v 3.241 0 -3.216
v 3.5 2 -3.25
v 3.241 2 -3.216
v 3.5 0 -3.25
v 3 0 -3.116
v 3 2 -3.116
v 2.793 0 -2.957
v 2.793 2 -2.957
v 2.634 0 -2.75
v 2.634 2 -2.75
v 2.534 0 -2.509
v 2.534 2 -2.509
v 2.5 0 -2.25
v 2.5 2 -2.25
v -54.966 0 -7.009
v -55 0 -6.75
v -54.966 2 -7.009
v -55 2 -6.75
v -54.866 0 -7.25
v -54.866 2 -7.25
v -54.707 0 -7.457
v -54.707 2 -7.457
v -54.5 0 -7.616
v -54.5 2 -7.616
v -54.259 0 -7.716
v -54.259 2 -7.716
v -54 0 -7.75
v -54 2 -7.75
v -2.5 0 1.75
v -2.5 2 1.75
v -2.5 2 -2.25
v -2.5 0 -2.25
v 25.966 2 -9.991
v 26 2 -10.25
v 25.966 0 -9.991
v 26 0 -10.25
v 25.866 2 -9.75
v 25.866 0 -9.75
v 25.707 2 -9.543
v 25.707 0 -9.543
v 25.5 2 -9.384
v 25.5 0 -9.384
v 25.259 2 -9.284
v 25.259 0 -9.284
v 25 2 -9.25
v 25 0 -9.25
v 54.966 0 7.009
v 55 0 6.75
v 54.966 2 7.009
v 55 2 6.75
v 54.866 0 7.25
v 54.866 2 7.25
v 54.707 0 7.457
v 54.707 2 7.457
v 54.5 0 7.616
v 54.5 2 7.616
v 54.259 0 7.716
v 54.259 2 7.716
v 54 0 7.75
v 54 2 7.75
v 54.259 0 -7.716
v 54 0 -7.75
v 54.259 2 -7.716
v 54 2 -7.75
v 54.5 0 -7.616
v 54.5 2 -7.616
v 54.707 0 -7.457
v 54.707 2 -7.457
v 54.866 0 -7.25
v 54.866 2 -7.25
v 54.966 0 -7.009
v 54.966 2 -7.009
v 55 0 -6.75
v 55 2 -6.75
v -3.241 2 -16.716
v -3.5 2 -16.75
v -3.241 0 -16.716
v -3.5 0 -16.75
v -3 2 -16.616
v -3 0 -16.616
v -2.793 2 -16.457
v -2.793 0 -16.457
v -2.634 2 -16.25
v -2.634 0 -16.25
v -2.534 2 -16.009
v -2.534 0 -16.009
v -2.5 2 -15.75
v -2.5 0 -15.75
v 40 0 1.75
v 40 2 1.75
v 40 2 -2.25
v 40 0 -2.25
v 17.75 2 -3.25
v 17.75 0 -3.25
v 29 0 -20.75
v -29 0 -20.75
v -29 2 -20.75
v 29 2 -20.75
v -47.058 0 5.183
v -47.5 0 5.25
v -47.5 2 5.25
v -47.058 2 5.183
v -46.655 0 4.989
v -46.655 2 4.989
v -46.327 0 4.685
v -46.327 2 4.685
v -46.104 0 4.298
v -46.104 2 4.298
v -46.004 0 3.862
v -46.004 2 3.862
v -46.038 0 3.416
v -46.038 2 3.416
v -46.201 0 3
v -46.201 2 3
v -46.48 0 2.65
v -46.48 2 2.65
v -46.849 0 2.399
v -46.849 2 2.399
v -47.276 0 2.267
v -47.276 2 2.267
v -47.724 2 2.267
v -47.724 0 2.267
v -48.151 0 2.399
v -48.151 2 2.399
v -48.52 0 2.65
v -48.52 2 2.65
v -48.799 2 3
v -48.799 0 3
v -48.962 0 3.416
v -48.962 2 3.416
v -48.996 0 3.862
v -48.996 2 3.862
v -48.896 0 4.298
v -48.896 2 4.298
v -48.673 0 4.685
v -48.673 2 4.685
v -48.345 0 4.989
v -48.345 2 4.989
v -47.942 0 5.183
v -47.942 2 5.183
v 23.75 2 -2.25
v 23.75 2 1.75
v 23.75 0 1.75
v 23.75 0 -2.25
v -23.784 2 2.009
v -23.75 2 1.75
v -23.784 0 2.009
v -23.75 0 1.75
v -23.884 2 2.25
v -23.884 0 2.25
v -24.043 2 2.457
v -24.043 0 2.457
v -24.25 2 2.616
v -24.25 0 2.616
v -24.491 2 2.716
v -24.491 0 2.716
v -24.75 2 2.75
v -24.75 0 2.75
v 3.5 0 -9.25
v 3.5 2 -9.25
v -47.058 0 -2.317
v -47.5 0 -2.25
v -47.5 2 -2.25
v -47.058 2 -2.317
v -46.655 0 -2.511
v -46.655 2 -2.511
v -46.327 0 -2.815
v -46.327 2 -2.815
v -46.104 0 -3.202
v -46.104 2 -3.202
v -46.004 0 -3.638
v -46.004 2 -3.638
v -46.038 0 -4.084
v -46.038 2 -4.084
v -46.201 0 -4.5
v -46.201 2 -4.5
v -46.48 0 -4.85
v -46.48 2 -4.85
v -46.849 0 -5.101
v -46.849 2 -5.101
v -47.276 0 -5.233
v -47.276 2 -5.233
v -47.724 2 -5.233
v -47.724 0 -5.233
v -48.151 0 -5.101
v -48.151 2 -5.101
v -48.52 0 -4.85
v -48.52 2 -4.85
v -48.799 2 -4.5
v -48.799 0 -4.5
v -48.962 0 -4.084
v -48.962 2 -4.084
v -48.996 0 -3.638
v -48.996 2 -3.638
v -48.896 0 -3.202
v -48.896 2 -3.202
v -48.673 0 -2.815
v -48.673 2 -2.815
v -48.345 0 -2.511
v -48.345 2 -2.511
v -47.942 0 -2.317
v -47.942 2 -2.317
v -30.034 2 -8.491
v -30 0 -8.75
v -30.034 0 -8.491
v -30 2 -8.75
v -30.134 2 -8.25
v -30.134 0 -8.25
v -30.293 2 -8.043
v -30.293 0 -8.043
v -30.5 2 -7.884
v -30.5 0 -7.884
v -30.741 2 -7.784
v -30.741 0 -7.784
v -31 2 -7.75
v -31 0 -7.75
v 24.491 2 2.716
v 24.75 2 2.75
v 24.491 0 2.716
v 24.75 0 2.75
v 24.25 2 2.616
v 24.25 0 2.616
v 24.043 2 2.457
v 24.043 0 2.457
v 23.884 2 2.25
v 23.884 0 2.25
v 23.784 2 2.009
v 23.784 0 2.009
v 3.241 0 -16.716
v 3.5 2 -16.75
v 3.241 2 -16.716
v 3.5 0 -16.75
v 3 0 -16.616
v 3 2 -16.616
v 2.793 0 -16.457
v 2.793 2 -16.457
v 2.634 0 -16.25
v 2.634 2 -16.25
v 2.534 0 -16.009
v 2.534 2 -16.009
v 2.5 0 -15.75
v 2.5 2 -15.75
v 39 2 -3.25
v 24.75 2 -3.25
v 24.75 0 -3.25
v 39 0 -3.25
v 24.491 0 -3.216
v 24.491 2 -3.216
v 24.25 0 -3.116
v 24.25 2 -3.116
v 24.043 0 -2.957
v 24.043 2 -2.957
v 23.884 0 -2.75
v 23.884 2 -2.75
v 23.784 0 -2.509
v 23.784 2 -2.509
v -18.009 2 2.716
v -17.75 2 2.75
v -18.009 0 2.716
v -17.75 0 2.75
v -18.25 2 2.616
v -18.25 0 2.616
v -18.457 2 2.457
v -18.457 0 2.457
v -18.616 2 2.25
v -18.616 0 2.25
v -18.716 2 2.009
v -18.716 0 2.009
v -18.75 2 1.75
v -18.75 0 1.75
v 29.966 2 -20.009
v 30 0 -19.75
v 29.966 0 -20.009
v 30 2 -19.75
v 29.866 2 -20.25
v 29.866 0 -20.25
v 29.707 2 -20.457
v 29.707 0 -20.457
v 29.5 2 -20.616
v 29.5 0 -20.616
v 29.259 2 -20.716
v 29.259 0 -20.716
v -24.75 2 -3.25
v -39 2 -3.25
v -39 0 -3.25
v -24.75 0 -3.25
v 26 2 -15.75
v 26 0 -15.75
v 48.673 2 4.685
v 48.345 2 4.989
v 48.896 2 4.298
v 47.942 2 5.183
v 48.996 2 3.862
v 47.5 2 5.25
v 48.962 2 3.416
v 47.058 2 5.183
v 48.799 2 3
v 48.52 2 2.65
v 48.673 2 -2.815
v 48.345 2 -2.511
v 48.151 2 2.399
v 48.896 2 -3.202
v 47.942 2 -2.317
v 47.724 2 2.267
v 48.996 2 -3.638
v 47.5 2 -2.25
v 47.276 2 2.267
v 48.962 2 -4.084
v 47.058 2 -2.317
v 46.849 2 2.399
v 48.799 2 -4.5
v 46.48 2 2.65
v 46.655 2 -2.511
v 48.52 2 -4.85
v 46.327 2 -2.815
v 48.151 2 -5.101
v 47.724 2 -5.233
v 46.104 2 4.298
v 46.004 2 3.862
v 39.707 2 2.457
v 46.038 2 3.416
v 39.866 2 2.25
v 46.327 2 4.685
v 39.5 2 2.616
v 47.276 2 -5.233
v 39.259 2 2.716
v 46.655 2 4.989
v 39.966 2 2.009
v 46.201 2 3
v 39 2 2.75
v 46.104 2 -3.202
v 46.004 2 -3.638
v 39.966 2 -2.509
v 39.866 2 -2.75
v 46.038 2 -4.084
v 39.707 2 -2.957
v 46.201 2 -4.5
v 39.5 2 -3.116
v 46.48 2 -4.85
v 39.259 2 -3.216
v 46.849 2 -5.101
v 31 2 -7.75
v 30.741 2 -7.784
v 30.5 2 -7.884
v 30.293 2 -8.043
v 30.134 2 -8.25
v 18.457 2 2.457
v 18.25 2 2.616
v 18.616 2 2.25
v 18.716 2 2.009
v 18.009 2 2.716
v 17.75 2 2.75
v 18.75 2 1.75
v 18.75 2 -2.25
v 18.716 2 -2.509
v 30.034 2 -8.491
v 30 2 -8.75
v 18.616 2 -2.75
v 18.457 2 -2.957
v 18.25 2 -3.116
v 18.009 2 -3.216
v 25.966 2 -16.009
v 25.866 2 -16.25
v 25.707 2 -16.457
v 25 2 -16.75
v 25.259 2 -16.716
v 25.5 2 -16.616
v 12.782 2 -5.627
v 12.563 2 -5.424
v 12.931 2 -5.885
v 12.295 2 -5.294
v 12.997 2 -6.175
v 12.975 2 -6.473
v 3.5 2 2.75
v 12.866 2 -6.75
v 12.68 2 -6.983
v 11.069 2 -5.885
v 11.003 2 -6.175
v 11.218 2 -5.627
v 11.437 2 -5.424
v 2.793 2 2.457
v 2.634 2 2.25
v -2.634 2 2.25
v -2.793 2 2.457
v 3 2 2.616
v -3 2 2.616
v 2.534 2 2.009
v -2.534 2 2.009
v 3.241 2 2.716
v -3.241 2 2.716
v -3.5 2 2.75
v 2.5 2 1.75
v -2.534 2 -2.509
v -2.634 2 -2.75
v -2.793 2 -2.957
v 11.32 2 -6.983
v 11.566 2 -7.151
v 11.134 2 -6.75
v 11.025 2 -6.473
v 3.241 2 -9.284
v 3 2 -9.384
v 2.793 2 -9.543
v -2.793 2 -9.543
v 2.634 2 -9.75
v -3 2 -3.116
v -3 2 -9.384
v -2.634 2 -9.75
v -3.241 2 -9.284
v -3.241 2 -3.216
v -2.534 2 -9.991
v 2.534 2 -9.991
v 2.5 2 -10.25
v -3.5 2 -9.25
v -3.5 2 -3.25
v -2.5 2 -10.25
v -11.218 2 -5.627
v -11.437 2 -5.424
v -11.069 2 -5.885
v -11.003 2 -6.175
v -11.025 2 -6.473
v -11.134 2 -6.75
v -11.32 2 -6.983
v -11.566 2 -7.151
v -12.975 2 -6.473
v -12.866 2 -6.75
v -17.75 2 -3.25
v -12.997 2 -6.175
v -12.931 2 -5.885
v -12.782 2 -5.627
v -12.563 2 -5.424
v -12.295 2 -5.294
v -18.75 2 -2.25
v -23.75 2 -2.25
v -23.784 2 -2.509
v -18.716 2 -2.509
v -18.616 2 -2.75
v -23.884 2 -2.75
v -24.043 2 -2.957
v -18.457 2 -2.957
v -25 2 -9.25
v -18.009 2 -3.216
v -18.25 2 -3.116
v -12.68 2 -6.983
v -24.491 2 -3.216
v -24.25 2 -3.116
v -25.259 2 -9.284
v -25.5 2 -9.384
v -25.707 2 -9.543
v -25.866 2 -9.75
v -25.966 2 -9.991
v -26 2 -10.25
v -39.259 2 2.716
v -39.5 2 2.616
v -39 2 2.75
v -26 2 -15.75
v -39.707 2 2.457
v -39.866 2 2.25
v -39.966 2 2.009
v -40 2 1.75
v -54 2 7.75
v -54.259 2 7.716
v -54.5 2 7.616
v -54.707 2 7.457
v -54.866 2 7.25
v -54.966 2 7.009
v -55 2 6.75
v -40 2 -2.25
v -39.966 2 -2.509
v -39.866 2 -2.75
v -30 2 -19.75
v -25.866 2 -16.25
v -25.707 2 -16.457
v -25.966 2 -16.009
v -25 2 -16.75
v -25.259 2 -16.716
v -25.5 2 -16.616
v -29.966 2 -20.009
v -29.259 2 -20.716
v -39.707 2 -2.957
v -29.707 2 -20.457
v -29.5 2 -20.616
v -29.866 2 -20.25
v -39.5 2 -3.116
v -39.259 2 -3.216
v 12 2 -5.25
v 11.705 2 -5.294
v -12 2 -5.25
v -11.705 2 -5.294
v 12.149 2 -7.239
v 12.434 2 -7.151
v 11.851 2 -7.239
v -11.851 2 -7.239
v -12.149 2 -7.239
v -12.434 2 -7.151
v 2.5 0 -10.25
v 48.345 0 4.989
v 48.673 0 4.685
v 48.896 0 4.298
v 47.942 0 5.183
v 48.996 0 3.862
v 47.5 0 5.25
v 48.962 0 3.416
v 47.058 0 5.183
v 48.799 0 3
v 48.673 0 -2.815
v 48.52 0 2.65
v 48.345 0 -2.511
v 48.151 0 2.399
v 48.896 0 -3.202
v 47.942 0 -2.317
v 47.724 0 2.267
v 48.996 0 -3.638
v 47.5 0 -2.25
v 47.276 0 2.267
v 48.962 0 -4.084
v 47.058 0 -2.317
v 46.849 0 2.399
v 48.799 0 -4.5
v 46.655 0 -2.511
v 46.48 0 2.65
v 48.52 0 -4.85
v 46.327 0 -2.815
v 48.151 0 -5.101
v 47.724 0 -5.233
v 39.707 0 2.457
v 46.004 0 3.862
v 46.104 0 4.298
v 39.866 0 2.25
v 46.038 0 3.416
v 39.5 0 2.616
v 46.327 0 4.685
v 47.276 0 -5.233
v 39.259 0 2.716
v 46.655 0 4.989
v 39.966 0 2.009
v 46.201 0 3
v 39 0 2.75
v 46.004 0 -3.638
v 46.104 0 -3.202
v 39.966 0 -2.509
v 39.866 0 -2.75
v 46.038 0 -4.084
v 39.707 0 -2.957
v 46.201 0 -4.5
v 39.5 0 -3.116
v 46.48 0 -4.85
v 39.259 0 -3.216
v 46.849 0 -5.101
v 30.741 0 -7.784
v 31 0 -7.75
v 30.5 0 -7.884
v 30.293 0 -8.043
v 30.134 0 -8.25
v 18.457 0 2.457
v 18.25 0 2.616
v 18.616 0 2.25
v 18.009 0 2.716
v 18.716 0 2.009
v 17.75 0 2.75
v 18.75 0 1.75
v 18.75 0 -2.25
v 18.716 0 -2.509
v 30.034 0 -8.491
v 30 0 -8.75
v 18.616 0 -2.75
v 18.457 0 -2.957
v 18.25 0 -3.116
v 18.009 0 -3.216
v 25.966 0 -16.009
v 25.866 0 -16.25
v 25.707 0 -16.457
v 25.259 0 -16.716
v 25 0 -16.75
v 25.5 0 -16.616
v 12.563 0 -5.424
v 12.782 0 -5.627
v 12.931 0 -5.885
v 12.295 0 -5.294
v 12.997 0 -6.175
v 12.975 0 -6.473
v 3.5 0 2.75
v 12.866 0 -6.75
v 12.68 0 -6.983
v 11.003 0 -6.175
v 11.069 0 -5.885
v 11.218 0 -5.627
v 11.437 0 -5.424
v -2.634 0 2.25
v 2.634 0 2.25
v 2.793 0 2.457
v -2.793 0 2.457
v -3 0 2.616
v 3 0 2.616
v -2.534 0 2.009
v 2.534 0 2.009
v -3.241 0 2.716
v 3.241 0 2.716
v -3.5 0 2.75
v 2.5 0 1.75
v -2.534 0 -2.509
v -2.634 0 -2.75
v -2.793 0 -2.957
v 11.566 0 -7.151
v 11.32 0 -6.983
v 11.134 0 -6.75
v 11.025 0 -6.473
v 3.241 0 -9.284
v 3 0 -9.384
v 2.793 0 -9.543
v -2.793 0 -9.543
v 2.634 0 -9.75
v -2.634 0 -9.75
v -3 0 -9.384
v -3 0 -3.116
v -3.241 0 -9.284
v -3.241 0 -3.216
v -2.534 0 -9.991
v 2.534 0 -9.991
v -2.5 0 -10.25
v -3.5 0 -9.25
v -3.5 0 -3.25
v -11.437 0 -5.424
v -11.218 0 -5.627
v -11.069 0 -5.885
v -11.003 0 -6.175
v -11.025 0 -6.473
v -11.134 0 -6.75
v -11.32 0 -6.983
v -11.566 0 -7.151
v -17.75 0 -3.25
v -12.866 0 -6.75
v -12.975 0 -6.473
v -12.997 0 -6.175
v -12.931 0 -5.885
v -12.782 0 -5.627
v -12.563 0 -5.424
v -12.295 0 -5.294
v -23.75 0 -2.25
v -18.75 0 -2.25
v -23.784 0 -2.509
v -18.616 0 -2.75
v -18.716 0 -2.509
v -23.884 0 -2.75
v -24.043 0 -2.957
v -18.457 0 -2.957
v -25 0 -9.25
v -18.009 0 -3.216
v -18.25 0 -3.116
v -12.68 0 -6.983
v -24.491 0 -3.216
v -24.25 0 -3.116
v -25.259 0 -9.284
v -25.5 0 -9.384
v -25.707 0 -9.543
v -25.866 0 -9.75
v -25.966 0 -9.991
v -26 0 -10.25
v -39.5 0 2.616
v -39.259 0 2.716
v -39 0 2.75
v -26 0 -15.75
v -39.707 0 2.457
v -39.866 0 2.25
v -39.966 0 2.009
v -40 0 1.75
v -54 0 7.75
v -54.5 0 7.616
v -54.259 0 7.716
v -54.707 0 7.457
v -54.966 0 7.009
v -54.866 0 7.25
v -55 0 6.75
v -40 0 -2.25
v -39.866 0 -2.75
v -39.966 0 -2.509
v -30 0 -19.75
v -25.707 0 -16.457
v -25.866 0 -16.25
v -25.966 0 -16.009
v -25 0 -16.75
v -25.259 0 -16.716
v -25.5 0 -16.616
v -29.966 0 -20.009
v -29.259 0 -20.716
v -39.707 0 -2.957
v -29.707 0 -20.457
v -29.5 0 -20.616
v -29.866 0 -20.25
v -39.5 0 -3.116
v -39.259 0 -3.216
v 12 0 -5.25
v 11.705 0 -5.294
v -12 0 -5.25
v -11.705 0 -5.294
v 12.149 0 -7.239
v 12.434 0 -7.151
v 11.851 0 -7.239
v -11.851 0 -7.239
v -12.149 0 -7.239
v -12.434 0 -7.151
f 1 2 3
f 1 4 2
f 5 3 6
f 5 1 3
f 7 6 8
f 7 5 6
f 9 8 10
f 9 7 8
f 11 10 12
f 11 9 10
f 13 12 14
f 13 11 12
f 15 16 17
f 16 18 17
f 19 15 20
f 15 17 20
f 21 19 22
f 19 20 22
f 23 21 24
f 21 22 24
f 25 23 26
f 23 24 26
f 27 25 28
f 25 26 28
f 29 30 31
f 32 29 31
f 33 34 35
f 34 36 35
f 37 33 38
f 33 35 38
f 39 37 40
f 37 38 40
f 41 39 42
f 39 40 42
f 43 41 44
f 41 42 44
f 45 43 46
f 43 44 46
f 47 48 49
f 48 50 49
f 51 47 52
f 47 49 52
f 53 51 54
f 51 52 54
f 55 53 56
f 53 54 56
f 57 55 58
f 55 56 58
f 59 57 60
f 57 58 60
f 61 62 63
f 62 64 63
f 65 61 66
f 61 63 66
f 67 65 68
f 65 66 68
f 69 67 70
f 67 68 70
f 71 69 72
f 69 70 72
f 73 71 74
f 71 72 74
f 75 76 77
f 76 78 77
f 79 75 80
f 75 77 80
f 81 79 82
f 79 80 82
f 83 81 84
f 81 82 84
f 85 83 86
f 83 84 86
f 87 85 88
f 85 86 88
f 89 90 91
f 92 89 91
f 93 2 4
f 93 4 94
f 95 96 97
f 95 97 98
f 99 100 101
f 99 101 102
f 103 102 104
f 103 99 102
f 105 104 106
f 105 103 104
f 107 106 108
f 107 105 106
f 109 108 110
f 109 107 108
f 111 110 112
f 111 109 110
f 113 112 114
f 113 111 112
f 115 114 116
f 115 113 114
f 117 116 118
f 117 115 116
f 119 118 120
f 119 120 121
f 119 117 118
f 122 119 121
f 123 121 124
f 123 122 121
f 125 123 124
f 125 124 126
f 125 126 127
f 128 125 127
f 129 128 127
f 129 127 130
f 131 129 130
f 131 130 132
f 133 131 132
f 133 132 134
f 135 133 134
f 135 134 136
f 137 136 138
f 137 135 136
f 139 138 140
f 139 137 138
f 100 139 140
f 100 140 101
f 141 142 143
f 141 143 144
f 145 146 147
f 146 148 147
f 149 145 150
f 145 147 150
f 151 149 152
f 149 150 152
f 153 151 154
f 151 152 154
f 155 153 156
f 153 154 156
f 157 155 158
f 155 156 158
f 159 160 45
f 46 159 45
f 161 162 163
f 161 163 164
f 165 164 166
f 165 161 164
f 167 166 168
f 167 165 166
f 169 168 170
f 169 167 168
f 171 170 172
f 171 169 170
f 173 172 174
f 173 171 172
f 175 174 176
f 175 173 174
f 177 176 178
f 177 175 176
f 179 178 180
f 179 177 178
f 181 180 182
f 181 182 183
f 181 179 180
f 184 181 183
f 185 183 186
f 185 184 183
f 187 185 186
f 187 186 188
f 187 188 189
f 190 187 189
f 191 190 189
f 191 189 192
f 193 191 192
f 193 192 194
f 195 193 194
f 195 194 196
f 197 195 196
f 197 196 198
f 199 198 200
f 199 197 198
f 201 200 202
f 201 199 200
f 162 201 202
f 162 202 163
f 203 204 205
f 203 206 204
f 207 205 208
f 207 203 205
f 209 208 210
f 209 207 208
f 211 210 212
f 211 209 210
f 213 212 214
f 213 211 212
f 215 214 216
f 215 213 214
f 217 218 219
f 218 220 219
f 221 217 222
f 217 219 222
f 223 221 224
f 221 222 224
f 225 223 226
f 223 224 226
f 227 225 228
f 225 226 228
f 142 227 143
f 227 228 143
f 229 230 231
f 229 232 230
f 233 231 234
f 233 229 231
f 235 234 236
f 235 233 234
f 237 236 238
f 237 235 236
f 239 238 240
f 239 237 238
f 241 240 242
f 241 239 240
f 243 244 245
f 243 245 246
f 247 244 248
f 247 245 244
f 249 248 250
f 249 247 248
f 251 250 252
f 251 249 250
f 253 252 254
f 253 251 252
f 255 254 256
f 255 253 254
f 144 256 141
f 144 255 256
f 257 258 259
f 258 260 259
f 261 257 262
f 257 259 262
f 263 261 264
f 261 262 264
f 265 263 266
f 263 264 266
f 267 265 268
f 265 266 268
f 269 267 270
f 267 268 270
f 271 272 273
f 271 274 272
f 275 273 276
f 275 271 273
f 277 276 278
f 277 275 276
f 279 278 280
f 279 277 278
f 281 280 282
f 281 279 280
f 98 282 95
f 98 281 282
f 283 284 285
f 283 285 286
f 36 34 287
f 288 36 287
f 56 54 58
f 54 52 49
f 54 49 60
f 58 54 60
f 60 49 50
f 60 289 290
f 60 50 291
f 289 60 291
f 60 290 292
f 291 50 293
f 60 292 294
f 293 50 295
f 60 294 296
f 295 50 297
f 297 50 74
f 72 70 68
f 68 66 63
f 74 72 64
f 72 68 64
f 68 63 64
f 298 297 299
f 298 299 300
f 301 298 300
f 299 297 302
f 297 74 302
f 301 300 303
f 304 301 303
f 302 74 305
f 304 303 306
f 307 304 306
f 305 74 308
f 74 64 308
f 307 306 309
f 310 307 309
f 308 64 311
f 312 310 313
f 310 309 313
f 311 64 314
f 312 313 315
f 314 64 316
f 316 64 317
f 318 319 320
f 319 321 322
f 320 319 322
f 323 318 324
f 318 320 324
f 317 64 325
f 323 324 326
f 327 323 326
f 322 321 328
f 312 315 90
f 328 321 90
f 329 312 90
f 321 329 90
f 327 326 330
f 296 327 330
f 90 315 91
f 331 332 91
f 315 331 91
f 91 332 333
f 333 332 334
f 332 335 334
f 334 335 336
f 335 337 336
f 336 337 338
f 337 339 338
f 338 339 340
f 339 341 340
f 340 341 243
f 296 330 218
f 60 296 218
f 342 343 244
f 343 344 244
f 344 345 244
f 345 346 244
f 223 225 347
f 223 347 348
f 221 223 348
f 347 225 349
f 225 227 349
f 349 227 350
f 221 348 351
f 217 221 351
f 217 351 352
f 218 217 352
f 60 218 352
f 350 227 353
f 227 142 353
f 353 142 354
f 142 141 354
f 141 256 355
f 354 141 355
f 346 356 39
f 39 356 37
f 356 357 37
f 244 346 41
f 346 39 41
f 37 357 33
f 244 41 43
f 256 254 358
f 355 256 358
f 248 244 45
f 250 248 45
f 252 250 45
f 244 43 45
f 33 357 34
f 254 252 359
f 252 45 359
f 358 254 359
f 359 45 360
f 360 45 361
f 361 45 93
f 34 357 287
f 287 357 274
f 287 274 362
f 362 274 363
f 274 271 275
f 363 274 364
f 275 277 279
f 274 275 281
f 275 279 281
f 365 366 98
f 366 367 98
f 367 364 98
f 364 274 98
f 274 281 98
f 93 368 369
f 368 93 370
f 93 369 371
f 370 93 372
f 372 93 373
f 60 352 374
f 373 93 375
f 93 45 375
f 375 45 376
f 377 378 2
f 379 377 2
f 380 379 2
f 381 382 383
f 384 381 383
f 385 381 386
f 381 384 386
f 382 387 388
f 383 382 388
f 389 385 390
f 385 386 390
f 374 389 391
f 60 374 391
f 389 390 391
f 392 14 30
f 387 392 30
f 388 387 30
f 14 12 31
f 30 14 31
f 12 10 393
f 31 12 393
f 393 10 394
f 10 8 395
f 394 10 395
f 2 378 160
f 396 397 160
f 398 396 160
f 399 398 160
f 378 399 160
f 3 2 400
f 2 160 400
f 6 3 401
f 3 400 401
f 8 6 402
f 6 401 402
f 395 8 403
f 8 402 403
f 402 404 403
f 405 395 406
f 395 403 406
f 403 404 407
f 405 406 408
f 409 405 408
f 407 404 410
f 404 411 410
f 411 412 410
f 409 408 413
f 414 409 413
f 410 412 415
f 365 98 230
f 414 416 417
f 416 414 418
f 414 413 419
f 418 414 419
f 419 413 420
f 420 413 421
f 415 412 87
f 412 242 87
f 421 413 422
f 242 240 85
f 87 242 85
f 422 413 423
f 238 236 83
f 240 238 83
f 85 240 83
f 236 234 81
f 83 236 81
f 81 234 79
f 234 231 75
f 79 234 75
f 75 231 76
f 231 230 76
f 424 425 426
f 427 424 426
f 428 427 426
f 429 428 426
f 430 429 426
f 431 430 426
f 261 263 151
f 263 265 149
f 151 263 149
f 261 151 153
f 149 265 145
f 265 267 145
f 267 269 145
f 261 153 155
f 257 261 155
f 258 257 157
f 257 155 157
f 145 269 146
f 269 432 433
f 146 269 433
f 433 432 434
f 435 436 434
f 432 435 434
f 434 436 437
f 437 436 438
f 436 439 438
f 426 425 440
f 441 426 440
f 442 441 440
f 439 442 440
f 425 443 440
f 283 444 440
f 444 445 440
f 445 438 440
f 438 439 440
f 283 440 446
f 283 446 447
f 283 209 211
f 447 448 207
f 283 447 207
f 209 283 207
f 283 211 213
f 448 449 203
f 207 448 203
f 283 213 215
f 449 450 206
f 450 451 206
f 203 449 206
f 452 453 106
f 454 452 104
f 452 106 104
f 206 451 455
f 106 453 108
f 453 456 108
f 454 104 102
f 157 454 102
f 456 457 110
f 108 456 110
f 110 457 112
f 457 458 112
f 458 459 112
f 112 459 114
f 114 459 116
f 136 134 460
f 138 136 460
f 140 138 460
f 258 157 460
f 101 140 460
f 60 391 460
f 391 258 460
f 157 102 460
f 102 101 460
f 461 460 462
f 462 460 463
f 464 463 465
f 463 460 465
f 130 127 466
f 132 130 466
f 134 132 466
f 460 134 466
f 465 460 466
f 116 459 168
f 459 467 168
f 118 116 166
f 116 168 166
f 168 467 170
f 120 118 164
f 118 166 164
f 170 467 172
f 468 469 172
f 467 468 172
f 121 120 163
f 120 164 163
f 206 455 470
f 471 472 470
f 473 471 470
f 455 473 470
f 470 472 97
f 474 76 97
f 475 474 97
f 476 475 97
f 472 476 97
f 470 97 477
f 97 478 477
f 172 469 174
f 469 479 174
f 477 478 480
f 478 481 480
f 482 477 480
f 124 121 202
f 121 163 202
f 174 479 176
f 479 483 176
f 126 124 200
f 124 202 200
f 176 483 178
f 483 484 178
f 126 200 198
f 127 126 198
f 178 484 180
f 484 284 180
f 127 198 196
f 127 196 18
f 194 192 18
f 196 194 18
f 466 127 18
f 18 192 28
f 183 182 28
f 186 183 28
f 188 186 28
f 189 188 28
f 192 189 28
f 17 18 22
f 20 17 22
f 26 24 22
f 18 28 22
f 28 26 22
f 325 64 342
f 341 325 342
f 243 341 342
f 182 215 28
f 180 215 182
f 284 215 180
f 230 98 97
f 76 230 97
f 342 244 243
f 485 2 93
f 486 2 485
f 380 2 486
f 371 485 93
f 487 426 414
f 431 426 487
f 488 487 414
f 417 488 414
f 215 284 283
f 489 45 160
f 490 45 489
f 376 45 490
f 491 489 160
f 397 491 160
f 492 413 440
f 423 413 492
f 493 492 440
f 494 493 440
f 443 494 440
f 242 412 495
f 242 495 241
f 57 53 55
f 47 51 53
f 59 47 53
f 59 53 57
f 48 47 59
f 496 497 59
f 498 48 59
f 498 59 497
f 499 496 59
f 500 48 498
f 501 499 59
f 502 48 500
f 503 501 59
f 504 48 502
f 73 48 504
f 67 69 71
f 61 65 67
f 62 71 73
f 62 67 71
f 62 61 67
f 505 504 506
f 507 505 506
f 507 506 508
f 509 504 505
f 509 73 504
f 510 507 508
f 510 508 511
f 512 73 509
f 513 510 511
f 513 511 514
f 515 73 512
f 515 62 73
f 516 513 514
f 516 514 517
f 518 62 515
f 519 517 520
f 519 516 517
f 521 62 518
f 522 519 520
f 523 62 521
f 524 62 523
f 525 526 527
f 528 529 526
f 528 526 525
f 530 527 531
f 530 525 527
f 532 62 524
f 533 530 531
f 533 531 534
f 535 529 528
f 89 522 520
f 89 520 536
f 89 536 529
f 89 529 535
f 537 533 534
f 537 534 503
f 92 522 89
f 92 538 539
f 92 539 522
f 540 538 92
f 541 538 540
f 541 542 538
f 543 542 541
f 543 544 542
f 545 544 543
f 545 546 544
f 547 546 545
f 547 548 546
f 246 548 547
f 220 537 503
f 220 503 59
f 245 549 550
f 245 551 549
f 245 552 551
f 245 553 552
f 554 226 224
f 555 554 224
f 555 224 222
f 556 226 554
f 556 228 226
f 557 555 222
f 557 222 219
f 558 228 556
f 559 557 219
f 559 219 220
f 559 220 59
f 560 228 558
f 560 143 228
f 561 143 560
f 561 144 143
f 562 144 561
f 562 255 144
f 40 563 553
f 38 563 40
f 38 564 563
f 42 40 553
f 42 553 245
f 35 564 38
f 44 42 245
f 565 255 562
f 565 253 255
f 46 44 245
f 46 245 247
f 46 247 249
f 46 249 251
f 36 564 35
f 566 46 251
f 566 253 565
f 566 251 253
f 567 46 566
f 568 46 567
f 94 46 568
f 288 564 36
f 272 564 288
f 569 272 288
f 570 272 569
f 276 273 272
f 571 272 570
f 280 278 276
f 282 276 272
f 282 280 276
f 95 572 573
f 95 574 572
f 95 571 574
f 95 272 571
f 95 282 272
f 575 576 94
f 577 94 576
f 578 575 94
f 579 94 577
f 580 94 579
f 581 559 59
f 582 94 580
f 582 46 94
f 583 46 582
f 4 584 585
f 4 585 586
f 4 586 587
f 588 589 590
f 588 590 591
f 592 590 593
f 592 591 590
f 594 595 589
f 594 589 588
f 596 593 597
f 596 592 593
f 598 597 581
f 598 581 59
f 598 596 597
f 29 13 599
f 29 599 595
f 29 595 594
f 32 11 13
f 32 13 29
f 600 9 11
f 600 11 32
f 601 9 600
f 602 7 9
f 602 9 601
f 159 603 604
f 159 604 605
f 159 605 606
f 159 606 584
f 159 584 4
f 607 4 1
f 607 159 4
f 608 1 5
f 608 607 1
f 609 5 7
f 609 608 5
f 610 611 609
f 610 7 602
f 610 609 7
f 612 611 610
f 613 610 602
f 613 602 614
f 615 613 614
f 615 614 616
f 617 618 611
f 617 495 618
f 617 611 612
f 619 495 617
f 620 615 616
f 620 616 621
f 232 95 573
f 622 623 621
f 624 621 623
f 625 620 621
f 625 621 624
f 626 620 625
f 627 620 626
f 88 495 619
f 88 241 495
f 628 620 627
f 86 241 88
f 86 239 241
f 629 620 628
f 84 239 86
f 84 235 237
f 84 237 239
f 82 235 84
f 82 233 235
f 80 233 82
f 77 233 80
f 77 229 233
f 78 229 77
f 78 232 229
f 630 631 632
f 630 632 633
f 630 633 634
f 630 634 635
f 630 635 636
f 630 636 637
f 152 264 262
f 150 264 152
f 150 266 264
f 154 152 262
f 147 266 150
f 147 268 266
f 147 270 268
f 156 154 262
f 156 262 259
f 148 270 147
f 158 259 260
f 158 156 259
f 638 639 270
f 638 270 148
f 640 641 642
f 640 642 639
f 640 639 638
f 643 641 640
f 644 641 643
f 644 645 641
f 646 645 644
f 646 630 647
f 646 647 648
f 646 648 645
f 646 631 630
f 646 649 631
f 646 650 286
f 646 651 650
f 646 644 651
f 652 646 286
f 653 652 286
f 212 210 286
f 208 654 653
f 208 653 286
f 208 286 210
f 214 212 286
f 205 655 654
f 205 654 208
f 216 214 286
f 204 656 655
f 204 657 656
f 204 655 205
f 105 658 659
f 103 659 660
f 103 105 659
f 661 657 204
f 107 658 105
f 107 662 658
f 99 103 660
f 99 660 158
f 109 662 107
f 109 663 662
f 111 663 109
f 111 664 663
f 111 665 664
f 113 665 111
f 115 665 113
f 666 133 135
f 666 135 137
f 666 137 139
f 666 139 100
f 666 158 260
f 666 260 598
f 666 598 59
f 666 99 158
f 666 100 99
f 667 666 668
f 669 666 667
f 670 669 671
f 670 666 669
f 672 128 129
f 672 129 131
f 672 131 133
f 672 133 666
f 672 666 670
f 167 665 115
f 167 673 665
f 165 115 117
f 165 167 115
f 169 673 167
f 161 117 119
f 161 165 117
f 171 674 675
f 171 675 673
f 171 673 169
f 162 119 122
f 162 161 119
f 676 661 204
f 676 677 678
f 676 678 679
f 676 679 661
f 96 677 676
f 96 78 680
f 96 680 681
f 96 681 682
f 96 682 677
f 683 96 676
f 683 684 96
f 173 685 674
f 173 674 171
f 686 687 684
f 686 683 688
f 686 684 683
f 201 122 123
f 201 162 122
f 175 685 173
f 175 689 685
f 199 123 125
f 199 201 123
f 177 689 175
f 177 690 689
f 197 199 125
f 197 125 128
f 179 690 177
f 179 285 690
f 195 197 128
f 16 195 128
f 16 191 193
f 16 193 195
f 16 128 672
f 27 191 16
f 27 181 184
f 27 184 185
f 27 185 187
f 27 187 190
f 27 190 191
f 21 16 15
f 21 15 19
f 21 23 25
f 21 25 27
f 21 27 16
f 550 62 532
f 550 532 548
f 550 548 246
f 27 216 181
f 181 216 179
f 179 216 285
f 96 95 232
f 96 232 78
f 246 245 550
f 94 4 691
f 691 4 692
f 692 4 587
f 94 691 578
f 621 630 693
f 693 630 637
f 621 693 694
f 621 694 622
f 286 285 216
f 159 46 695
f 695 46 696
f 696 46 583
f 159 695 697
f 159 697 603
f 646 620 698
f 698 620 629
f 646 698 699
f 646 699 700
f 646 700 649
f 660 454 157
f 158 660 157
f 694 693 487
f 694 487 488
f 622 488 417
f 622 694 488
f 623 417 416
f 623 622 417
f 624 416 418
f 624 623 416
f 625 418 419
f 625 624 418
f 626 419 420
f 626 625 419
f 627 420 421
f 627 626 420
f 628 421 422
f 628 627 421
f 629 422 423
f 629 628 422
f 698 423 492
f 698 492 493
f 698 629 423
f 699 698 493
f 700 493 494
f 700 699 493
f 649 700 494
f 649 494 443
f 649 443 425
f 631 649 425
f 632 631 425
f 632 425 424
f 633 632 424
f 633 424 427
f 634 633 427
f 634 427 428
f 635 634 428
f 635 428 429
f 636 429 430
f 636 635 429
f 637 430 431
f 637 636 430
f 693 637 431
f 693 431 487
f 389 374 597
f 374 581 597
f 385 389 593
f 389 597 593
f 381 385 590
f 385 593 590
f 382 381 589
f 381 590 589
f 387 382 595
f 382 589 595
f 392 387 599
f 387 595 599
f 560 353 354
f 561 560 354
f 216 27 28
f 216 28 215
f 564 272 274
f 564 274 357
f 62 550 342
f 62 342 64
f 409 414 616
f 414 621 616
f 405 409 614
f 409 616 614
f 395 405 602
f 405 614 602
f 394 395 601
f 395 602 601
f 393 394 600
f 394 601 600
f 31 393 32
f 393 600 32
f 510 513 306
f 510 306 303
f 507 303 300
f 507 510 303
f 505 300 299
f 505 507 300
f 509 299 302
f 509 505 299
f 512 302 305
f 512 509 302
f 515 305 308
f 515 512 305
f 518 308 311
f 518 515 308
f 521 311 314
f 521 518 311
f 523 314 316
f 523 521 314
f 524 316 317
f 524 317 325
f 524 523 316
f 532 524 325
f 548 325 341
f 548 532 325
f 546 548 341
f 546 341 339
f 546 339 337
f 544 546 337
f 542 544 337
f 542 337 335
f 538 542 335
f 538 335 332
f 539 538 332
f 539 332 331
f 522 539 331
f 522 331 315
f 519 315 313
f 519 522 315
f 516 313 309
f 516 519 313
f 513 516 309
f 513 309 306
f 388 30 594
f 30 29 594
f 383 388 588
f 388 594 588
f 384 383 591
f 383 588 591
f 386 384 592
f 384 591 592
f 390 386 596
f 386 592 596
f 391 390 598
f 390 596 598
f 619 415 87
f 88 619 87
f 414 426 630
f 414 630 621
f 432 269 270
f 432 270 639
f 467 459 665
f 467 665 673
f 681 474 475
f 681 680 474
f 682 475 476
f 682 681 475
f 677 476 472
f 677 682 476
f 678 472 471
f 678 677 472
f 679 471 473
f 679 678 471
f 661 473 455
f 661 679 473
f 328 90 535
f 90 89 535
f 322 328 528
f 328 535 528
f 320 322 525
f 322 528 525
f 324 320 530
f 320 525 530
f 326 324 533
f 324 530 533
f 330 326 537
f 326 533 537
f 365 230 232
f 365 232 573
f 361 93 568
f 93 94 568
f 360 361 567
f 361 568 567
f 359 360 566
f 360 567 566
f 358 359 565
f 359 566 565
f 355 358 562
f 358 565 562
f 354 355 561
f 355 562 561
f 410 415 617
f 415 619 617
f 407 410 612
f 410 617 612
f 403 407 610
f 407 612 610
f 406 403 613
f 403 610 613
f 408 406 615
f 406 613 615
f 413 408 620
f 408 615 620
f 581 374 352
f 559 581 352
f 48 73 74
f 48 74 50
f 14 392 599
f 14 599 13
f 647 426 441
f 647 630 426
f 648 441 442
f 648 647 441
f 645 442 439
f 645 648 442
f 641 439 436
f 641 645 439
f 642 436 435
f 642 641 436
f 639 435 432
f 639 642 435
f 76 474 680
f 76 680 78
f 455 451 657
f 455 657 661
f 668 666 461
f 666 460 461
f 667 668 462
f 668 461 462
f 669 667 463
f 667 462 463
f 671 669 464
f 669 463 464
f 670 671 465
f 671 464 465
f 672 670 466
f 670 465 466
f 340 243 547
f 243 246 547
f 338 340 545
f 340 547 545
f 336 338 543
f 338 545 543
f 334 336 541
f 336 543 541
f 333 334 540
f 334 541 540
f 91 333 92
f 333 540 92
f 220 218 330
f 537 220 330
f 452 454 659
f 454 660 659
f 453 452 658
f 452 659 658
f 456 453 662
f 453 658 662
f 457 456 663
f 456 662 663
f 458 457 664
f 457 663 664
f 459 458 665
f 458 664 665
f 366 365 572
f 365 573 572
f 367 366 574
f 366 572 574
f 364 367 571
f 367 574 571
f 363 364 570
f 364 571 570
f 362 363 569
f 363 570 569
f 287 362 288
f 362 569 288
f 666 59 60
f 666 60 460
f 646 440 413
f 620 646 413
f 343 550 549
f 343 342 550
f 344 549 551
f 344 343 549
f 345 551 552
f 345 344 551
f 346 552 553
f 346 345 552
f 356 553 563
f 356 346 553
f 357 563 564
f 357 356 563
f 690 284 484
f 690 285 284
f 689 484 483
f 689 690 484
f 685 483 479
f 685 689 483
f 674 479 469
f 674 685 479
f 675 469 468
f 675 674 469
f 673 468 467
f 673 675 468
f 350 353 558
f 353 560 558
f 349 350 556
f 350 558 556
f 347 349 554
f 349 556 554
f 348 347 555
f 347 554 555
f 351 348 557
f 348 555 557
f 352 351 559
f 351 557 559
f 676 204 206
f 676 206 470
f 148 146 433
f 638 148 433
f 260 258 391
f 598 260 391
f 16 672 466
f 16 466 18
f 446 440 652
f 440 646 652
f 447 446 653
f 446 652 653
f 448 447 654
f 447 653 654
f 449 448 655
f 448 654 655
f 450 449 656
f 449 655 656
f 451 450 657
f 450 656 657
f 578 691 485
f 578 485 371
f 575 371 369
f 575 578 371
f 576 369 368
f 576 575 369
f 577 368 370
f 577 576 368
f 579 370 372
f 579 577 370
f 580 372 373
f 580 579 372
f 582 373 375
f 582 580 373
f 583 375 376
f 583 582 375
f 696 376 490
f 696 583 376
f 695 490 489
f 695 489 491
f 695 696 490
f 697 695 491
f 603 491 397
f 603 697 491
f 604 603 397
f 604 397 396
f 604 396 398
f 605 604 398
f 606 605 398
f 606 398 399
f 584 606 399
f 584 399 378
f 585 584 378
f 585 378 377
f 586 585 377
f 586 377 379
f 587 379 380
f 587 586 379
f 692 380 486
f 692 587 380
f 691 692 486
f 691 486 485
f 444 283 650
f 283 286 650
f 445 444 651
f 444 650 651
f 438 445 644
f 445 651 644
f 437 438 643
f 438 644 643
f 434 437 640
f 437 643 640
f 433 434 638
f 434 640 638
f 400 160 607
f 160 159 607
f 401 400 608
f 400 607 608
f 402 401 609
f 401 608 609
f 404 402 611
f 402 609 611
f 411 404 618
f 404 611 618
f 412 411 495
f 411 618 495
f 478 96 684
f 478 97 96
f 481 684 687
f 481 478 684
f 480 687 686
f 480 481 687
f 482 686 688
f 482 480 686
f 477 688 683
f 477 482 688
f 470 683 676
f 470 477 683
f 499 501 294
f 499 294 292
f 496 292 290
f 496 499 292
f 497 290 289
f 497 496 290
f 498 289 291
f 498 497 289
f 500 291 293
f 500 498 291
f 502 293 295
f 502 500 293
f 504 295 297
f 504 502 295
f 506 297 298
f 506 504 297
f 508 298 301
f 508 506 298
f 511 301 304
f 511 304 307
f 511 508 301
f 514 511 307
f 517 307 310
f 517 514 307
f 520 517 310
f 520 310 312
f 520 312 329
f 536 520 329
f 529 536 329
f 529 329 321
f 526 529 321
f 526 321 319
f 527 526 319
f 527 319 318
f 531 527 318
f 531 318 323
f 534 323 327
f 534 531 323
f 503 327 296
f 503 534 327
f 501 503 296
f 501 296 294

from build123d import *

# Parameters (mm, degrees)
SKETCH_1_R          = 1.5
SKETCH_1_R_2        = 1
EXTRUDE_1_DEPTH     = 2
SKETCH_2_W          = 16.25
SKETCH_2_H          = 6
SKETCH_2_W_2        = 23.5
SKETCH_2_H_2        = 7.5
CUT_EXTRUDE_1_DEPTH = 59.8180457
FILLET_1_R          = 1


with BuildPart() as part:
    # 草图1 → 凸台-拉伸1 (new body)
    with BuildSketch(Plane(origin=(0, 0, 0), x_dir=(1, 0, 0), z_dir=(0, 1, 0))):
        Polygon((30, 7.75), (55, 7.75), (55, -7.75), (-55, -7.75), (-55, 7.75), (-30, 7.75), (-30, 20.75), (30, 20.75), align=None)
        with Locations(Location((-47.5, 3.75, 0), (0, 0, 270))):
            Circle(SKETCH_1_R, mode=Mode.SUBTRACT)
        with Locations(Location((-47.5, -3.75, 0), (0, 0, 270))):
            Circle(SKETCH_1_R, mode=Mode.SUBTRACT)
        with Locations(Location((47.5, 3.75, 0), (0, 0, 270))):
            Circle(SKETCH_1_R, mode=Mode.SUBTRACT)
        with Locations(Location((47.5, -3.75, 0), (0, 0, 270))):
            Circle(SKETCH_1_R, mode=Mode.SUBTRACT)
        with Locations(Location((-12, 6.25, 0), (0, 0, 270))):
            Circle(SKETCH_1_R_2, mode=Mode.SUBTRACT)
        with Locations(Location((12, 6.25, 0), (0, 0, 270))):
            Circle(SKETCH_1_R_2, mode=Mode.SUBTRACT)
    extrude(amount=EXTRUDE_1_DEPTH)

    # 草图2 → 切除-拉伸1 (cut, through all)
    with BuildSketch(Plane(origin=(0, 2, 0), x_dir=(1, 0, 0), z_dir=(0, 1, 0))):
        with Locations((-31.875, 0.25)):
            Rectangle(SKETCH_2_W, SKETCH_2_H)
        with Locations((-10.625, 0.25)):
            Rectangle(SKETCH_2_W, SKETCH_2_H)
        with Locations((10.625, 0.25)):
            Rectangle(SKETCH_2_W, SKETCH_2_H)
        with Locations((31.875, 0.25)):
            Rectangle(SKETCH_2_W, SKETCH_2_H)
        with Locations((-14.25, 13)):
            Rectangle(SKETCH_2_W_2, SKETCH_2_H_2)
        with Locations((14.25, 13)):
            Rectangle(SKETCH_2_W_2, SKETCH_2_H_2)
    extrude(amount=-CUT_EXTRUDE_1_DEPTH, mode=Mode.SUBTRACT)

    # 圆角1
    fillet_1_edges = [part.edges().sort_by_distance(p)[0] for p in [
        (-40, 1, 2.75),
        (-40, 1, -3.25),
        (-23.75, 1, -3.25),
        (-23.75, 1, 2.75),
        (-55, 1, -7.75),
        (-30, 1, -7.75),
        (-30, 1, -20.75),
        (30, 1, -20.75),
        (30, 1, -7.75),
        (55, 1, -7.75),
        (55, 1, 7.75),
        (-55, 1, 7.75),
        (40, 1, 2.75),
        (23.75, 1, 2.75),
        (23.75, 1, -3.25),
        (40, 1, -3.25),
        (-26, 1, -9.25),
        (-26, 1, -16.75),
        (-2.5, 1, -16.75),
        (-2.5, 1, -9.25),
        (2.5, 1, -16.75),
        (26, 1, -16.75),
        (26, 1, -9.25),
        (2.5, 1, -9.25),
        (-18.75, 1, 2.75),
        (-18.75, 1, -3.25),
        (-2.5, 1, -3.25),
        (-2.5, 1, 2.75),
        (18.75, 1, -3.25),
        (18.75, 1, 2.75),
        (2.5, 1, 2.75),
        (2.5, 1, -3.25),
    ]]
    fillet(fillet_1_edges, radius=FILLET_1_R)


solid = part.part
